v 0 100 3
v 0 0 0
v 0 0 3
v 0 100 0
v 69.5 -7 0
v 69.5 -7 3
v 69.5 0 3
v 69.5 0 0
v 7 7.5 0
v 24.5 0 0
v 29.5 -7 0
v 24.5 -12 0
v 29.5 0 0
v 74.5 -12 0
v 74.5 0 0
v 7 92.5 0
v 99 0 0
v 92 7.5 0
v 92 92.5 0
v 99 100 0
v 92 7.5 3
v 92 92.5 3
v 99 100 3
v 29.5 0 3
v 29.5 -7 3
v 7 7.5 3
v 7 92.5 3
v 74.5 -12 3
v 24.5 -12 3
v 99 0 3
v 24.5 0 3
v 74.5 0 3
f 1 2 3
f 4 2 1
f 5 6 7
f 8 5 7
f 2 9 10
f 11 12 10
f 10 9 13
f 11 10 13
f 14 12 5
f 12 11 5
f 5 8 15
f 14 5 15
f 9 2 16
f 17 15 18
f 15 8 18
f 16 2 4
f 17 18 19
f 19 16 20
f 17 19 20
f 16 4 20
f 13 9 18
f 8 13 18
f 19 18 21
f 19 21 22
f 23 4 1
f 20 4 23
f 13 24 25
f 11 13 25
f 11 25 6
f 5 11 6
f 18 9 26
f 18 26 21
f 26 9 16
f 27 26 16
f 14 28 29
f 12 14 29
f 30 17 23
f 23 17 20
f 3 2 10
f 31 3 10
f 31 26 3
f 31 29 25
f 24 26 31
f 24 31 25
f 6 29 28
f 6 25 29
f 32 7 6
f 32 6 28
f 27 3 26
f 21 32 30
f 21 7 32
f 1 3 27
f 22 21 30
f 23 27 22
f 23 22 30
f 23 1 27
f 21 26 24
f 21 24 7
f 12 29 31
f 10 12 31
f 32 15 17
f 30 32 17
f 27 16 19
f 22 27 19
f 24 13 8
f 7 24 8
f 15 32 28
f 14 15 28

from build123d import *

# Parameters (mm, degrees)
CROQUIS1_W              = 99
CROQUIS1_H              = 100
CROQUIS1_W_2            = 85
CROQUIS1_H_2            = 85
SALIENTE_EXTRUIR1_DEPTH = 3
SALIENTE_EXTRUIR2_DEPTH = 3


with BuildPart() as part:
    # Croquis1 → Saliente-Extruir1 (new body)
    with BuildSketch(Plane.XY):
        with Locations((49.5, 50)):
            Rectangle(CROQUIS1_W, CROQUIS1_H)
        with Locations((49.5, 50)):
            Rectangle(CROQUIS1_W_2, CROQUIS1_H_2, mode=Mode.SUBTRACT)
    extrude(amount=SALIENTE_EXTRUIR1_DEPTH)

    # Croquis2 → Saliente-Extruir2 (add)
    with BuildSketch(Plane.XY.offset(3)):
        Polygon((24.5, 0), (29.5, 0), (29.5, -7), (69.5, -7), (69.5, 0), (74.5, 0), (74.5, -12), (24.5, -12), align=None)
    extrude(amount=-SALIENTE_EXTRUIR2_DEPTH)


solid = part.part
